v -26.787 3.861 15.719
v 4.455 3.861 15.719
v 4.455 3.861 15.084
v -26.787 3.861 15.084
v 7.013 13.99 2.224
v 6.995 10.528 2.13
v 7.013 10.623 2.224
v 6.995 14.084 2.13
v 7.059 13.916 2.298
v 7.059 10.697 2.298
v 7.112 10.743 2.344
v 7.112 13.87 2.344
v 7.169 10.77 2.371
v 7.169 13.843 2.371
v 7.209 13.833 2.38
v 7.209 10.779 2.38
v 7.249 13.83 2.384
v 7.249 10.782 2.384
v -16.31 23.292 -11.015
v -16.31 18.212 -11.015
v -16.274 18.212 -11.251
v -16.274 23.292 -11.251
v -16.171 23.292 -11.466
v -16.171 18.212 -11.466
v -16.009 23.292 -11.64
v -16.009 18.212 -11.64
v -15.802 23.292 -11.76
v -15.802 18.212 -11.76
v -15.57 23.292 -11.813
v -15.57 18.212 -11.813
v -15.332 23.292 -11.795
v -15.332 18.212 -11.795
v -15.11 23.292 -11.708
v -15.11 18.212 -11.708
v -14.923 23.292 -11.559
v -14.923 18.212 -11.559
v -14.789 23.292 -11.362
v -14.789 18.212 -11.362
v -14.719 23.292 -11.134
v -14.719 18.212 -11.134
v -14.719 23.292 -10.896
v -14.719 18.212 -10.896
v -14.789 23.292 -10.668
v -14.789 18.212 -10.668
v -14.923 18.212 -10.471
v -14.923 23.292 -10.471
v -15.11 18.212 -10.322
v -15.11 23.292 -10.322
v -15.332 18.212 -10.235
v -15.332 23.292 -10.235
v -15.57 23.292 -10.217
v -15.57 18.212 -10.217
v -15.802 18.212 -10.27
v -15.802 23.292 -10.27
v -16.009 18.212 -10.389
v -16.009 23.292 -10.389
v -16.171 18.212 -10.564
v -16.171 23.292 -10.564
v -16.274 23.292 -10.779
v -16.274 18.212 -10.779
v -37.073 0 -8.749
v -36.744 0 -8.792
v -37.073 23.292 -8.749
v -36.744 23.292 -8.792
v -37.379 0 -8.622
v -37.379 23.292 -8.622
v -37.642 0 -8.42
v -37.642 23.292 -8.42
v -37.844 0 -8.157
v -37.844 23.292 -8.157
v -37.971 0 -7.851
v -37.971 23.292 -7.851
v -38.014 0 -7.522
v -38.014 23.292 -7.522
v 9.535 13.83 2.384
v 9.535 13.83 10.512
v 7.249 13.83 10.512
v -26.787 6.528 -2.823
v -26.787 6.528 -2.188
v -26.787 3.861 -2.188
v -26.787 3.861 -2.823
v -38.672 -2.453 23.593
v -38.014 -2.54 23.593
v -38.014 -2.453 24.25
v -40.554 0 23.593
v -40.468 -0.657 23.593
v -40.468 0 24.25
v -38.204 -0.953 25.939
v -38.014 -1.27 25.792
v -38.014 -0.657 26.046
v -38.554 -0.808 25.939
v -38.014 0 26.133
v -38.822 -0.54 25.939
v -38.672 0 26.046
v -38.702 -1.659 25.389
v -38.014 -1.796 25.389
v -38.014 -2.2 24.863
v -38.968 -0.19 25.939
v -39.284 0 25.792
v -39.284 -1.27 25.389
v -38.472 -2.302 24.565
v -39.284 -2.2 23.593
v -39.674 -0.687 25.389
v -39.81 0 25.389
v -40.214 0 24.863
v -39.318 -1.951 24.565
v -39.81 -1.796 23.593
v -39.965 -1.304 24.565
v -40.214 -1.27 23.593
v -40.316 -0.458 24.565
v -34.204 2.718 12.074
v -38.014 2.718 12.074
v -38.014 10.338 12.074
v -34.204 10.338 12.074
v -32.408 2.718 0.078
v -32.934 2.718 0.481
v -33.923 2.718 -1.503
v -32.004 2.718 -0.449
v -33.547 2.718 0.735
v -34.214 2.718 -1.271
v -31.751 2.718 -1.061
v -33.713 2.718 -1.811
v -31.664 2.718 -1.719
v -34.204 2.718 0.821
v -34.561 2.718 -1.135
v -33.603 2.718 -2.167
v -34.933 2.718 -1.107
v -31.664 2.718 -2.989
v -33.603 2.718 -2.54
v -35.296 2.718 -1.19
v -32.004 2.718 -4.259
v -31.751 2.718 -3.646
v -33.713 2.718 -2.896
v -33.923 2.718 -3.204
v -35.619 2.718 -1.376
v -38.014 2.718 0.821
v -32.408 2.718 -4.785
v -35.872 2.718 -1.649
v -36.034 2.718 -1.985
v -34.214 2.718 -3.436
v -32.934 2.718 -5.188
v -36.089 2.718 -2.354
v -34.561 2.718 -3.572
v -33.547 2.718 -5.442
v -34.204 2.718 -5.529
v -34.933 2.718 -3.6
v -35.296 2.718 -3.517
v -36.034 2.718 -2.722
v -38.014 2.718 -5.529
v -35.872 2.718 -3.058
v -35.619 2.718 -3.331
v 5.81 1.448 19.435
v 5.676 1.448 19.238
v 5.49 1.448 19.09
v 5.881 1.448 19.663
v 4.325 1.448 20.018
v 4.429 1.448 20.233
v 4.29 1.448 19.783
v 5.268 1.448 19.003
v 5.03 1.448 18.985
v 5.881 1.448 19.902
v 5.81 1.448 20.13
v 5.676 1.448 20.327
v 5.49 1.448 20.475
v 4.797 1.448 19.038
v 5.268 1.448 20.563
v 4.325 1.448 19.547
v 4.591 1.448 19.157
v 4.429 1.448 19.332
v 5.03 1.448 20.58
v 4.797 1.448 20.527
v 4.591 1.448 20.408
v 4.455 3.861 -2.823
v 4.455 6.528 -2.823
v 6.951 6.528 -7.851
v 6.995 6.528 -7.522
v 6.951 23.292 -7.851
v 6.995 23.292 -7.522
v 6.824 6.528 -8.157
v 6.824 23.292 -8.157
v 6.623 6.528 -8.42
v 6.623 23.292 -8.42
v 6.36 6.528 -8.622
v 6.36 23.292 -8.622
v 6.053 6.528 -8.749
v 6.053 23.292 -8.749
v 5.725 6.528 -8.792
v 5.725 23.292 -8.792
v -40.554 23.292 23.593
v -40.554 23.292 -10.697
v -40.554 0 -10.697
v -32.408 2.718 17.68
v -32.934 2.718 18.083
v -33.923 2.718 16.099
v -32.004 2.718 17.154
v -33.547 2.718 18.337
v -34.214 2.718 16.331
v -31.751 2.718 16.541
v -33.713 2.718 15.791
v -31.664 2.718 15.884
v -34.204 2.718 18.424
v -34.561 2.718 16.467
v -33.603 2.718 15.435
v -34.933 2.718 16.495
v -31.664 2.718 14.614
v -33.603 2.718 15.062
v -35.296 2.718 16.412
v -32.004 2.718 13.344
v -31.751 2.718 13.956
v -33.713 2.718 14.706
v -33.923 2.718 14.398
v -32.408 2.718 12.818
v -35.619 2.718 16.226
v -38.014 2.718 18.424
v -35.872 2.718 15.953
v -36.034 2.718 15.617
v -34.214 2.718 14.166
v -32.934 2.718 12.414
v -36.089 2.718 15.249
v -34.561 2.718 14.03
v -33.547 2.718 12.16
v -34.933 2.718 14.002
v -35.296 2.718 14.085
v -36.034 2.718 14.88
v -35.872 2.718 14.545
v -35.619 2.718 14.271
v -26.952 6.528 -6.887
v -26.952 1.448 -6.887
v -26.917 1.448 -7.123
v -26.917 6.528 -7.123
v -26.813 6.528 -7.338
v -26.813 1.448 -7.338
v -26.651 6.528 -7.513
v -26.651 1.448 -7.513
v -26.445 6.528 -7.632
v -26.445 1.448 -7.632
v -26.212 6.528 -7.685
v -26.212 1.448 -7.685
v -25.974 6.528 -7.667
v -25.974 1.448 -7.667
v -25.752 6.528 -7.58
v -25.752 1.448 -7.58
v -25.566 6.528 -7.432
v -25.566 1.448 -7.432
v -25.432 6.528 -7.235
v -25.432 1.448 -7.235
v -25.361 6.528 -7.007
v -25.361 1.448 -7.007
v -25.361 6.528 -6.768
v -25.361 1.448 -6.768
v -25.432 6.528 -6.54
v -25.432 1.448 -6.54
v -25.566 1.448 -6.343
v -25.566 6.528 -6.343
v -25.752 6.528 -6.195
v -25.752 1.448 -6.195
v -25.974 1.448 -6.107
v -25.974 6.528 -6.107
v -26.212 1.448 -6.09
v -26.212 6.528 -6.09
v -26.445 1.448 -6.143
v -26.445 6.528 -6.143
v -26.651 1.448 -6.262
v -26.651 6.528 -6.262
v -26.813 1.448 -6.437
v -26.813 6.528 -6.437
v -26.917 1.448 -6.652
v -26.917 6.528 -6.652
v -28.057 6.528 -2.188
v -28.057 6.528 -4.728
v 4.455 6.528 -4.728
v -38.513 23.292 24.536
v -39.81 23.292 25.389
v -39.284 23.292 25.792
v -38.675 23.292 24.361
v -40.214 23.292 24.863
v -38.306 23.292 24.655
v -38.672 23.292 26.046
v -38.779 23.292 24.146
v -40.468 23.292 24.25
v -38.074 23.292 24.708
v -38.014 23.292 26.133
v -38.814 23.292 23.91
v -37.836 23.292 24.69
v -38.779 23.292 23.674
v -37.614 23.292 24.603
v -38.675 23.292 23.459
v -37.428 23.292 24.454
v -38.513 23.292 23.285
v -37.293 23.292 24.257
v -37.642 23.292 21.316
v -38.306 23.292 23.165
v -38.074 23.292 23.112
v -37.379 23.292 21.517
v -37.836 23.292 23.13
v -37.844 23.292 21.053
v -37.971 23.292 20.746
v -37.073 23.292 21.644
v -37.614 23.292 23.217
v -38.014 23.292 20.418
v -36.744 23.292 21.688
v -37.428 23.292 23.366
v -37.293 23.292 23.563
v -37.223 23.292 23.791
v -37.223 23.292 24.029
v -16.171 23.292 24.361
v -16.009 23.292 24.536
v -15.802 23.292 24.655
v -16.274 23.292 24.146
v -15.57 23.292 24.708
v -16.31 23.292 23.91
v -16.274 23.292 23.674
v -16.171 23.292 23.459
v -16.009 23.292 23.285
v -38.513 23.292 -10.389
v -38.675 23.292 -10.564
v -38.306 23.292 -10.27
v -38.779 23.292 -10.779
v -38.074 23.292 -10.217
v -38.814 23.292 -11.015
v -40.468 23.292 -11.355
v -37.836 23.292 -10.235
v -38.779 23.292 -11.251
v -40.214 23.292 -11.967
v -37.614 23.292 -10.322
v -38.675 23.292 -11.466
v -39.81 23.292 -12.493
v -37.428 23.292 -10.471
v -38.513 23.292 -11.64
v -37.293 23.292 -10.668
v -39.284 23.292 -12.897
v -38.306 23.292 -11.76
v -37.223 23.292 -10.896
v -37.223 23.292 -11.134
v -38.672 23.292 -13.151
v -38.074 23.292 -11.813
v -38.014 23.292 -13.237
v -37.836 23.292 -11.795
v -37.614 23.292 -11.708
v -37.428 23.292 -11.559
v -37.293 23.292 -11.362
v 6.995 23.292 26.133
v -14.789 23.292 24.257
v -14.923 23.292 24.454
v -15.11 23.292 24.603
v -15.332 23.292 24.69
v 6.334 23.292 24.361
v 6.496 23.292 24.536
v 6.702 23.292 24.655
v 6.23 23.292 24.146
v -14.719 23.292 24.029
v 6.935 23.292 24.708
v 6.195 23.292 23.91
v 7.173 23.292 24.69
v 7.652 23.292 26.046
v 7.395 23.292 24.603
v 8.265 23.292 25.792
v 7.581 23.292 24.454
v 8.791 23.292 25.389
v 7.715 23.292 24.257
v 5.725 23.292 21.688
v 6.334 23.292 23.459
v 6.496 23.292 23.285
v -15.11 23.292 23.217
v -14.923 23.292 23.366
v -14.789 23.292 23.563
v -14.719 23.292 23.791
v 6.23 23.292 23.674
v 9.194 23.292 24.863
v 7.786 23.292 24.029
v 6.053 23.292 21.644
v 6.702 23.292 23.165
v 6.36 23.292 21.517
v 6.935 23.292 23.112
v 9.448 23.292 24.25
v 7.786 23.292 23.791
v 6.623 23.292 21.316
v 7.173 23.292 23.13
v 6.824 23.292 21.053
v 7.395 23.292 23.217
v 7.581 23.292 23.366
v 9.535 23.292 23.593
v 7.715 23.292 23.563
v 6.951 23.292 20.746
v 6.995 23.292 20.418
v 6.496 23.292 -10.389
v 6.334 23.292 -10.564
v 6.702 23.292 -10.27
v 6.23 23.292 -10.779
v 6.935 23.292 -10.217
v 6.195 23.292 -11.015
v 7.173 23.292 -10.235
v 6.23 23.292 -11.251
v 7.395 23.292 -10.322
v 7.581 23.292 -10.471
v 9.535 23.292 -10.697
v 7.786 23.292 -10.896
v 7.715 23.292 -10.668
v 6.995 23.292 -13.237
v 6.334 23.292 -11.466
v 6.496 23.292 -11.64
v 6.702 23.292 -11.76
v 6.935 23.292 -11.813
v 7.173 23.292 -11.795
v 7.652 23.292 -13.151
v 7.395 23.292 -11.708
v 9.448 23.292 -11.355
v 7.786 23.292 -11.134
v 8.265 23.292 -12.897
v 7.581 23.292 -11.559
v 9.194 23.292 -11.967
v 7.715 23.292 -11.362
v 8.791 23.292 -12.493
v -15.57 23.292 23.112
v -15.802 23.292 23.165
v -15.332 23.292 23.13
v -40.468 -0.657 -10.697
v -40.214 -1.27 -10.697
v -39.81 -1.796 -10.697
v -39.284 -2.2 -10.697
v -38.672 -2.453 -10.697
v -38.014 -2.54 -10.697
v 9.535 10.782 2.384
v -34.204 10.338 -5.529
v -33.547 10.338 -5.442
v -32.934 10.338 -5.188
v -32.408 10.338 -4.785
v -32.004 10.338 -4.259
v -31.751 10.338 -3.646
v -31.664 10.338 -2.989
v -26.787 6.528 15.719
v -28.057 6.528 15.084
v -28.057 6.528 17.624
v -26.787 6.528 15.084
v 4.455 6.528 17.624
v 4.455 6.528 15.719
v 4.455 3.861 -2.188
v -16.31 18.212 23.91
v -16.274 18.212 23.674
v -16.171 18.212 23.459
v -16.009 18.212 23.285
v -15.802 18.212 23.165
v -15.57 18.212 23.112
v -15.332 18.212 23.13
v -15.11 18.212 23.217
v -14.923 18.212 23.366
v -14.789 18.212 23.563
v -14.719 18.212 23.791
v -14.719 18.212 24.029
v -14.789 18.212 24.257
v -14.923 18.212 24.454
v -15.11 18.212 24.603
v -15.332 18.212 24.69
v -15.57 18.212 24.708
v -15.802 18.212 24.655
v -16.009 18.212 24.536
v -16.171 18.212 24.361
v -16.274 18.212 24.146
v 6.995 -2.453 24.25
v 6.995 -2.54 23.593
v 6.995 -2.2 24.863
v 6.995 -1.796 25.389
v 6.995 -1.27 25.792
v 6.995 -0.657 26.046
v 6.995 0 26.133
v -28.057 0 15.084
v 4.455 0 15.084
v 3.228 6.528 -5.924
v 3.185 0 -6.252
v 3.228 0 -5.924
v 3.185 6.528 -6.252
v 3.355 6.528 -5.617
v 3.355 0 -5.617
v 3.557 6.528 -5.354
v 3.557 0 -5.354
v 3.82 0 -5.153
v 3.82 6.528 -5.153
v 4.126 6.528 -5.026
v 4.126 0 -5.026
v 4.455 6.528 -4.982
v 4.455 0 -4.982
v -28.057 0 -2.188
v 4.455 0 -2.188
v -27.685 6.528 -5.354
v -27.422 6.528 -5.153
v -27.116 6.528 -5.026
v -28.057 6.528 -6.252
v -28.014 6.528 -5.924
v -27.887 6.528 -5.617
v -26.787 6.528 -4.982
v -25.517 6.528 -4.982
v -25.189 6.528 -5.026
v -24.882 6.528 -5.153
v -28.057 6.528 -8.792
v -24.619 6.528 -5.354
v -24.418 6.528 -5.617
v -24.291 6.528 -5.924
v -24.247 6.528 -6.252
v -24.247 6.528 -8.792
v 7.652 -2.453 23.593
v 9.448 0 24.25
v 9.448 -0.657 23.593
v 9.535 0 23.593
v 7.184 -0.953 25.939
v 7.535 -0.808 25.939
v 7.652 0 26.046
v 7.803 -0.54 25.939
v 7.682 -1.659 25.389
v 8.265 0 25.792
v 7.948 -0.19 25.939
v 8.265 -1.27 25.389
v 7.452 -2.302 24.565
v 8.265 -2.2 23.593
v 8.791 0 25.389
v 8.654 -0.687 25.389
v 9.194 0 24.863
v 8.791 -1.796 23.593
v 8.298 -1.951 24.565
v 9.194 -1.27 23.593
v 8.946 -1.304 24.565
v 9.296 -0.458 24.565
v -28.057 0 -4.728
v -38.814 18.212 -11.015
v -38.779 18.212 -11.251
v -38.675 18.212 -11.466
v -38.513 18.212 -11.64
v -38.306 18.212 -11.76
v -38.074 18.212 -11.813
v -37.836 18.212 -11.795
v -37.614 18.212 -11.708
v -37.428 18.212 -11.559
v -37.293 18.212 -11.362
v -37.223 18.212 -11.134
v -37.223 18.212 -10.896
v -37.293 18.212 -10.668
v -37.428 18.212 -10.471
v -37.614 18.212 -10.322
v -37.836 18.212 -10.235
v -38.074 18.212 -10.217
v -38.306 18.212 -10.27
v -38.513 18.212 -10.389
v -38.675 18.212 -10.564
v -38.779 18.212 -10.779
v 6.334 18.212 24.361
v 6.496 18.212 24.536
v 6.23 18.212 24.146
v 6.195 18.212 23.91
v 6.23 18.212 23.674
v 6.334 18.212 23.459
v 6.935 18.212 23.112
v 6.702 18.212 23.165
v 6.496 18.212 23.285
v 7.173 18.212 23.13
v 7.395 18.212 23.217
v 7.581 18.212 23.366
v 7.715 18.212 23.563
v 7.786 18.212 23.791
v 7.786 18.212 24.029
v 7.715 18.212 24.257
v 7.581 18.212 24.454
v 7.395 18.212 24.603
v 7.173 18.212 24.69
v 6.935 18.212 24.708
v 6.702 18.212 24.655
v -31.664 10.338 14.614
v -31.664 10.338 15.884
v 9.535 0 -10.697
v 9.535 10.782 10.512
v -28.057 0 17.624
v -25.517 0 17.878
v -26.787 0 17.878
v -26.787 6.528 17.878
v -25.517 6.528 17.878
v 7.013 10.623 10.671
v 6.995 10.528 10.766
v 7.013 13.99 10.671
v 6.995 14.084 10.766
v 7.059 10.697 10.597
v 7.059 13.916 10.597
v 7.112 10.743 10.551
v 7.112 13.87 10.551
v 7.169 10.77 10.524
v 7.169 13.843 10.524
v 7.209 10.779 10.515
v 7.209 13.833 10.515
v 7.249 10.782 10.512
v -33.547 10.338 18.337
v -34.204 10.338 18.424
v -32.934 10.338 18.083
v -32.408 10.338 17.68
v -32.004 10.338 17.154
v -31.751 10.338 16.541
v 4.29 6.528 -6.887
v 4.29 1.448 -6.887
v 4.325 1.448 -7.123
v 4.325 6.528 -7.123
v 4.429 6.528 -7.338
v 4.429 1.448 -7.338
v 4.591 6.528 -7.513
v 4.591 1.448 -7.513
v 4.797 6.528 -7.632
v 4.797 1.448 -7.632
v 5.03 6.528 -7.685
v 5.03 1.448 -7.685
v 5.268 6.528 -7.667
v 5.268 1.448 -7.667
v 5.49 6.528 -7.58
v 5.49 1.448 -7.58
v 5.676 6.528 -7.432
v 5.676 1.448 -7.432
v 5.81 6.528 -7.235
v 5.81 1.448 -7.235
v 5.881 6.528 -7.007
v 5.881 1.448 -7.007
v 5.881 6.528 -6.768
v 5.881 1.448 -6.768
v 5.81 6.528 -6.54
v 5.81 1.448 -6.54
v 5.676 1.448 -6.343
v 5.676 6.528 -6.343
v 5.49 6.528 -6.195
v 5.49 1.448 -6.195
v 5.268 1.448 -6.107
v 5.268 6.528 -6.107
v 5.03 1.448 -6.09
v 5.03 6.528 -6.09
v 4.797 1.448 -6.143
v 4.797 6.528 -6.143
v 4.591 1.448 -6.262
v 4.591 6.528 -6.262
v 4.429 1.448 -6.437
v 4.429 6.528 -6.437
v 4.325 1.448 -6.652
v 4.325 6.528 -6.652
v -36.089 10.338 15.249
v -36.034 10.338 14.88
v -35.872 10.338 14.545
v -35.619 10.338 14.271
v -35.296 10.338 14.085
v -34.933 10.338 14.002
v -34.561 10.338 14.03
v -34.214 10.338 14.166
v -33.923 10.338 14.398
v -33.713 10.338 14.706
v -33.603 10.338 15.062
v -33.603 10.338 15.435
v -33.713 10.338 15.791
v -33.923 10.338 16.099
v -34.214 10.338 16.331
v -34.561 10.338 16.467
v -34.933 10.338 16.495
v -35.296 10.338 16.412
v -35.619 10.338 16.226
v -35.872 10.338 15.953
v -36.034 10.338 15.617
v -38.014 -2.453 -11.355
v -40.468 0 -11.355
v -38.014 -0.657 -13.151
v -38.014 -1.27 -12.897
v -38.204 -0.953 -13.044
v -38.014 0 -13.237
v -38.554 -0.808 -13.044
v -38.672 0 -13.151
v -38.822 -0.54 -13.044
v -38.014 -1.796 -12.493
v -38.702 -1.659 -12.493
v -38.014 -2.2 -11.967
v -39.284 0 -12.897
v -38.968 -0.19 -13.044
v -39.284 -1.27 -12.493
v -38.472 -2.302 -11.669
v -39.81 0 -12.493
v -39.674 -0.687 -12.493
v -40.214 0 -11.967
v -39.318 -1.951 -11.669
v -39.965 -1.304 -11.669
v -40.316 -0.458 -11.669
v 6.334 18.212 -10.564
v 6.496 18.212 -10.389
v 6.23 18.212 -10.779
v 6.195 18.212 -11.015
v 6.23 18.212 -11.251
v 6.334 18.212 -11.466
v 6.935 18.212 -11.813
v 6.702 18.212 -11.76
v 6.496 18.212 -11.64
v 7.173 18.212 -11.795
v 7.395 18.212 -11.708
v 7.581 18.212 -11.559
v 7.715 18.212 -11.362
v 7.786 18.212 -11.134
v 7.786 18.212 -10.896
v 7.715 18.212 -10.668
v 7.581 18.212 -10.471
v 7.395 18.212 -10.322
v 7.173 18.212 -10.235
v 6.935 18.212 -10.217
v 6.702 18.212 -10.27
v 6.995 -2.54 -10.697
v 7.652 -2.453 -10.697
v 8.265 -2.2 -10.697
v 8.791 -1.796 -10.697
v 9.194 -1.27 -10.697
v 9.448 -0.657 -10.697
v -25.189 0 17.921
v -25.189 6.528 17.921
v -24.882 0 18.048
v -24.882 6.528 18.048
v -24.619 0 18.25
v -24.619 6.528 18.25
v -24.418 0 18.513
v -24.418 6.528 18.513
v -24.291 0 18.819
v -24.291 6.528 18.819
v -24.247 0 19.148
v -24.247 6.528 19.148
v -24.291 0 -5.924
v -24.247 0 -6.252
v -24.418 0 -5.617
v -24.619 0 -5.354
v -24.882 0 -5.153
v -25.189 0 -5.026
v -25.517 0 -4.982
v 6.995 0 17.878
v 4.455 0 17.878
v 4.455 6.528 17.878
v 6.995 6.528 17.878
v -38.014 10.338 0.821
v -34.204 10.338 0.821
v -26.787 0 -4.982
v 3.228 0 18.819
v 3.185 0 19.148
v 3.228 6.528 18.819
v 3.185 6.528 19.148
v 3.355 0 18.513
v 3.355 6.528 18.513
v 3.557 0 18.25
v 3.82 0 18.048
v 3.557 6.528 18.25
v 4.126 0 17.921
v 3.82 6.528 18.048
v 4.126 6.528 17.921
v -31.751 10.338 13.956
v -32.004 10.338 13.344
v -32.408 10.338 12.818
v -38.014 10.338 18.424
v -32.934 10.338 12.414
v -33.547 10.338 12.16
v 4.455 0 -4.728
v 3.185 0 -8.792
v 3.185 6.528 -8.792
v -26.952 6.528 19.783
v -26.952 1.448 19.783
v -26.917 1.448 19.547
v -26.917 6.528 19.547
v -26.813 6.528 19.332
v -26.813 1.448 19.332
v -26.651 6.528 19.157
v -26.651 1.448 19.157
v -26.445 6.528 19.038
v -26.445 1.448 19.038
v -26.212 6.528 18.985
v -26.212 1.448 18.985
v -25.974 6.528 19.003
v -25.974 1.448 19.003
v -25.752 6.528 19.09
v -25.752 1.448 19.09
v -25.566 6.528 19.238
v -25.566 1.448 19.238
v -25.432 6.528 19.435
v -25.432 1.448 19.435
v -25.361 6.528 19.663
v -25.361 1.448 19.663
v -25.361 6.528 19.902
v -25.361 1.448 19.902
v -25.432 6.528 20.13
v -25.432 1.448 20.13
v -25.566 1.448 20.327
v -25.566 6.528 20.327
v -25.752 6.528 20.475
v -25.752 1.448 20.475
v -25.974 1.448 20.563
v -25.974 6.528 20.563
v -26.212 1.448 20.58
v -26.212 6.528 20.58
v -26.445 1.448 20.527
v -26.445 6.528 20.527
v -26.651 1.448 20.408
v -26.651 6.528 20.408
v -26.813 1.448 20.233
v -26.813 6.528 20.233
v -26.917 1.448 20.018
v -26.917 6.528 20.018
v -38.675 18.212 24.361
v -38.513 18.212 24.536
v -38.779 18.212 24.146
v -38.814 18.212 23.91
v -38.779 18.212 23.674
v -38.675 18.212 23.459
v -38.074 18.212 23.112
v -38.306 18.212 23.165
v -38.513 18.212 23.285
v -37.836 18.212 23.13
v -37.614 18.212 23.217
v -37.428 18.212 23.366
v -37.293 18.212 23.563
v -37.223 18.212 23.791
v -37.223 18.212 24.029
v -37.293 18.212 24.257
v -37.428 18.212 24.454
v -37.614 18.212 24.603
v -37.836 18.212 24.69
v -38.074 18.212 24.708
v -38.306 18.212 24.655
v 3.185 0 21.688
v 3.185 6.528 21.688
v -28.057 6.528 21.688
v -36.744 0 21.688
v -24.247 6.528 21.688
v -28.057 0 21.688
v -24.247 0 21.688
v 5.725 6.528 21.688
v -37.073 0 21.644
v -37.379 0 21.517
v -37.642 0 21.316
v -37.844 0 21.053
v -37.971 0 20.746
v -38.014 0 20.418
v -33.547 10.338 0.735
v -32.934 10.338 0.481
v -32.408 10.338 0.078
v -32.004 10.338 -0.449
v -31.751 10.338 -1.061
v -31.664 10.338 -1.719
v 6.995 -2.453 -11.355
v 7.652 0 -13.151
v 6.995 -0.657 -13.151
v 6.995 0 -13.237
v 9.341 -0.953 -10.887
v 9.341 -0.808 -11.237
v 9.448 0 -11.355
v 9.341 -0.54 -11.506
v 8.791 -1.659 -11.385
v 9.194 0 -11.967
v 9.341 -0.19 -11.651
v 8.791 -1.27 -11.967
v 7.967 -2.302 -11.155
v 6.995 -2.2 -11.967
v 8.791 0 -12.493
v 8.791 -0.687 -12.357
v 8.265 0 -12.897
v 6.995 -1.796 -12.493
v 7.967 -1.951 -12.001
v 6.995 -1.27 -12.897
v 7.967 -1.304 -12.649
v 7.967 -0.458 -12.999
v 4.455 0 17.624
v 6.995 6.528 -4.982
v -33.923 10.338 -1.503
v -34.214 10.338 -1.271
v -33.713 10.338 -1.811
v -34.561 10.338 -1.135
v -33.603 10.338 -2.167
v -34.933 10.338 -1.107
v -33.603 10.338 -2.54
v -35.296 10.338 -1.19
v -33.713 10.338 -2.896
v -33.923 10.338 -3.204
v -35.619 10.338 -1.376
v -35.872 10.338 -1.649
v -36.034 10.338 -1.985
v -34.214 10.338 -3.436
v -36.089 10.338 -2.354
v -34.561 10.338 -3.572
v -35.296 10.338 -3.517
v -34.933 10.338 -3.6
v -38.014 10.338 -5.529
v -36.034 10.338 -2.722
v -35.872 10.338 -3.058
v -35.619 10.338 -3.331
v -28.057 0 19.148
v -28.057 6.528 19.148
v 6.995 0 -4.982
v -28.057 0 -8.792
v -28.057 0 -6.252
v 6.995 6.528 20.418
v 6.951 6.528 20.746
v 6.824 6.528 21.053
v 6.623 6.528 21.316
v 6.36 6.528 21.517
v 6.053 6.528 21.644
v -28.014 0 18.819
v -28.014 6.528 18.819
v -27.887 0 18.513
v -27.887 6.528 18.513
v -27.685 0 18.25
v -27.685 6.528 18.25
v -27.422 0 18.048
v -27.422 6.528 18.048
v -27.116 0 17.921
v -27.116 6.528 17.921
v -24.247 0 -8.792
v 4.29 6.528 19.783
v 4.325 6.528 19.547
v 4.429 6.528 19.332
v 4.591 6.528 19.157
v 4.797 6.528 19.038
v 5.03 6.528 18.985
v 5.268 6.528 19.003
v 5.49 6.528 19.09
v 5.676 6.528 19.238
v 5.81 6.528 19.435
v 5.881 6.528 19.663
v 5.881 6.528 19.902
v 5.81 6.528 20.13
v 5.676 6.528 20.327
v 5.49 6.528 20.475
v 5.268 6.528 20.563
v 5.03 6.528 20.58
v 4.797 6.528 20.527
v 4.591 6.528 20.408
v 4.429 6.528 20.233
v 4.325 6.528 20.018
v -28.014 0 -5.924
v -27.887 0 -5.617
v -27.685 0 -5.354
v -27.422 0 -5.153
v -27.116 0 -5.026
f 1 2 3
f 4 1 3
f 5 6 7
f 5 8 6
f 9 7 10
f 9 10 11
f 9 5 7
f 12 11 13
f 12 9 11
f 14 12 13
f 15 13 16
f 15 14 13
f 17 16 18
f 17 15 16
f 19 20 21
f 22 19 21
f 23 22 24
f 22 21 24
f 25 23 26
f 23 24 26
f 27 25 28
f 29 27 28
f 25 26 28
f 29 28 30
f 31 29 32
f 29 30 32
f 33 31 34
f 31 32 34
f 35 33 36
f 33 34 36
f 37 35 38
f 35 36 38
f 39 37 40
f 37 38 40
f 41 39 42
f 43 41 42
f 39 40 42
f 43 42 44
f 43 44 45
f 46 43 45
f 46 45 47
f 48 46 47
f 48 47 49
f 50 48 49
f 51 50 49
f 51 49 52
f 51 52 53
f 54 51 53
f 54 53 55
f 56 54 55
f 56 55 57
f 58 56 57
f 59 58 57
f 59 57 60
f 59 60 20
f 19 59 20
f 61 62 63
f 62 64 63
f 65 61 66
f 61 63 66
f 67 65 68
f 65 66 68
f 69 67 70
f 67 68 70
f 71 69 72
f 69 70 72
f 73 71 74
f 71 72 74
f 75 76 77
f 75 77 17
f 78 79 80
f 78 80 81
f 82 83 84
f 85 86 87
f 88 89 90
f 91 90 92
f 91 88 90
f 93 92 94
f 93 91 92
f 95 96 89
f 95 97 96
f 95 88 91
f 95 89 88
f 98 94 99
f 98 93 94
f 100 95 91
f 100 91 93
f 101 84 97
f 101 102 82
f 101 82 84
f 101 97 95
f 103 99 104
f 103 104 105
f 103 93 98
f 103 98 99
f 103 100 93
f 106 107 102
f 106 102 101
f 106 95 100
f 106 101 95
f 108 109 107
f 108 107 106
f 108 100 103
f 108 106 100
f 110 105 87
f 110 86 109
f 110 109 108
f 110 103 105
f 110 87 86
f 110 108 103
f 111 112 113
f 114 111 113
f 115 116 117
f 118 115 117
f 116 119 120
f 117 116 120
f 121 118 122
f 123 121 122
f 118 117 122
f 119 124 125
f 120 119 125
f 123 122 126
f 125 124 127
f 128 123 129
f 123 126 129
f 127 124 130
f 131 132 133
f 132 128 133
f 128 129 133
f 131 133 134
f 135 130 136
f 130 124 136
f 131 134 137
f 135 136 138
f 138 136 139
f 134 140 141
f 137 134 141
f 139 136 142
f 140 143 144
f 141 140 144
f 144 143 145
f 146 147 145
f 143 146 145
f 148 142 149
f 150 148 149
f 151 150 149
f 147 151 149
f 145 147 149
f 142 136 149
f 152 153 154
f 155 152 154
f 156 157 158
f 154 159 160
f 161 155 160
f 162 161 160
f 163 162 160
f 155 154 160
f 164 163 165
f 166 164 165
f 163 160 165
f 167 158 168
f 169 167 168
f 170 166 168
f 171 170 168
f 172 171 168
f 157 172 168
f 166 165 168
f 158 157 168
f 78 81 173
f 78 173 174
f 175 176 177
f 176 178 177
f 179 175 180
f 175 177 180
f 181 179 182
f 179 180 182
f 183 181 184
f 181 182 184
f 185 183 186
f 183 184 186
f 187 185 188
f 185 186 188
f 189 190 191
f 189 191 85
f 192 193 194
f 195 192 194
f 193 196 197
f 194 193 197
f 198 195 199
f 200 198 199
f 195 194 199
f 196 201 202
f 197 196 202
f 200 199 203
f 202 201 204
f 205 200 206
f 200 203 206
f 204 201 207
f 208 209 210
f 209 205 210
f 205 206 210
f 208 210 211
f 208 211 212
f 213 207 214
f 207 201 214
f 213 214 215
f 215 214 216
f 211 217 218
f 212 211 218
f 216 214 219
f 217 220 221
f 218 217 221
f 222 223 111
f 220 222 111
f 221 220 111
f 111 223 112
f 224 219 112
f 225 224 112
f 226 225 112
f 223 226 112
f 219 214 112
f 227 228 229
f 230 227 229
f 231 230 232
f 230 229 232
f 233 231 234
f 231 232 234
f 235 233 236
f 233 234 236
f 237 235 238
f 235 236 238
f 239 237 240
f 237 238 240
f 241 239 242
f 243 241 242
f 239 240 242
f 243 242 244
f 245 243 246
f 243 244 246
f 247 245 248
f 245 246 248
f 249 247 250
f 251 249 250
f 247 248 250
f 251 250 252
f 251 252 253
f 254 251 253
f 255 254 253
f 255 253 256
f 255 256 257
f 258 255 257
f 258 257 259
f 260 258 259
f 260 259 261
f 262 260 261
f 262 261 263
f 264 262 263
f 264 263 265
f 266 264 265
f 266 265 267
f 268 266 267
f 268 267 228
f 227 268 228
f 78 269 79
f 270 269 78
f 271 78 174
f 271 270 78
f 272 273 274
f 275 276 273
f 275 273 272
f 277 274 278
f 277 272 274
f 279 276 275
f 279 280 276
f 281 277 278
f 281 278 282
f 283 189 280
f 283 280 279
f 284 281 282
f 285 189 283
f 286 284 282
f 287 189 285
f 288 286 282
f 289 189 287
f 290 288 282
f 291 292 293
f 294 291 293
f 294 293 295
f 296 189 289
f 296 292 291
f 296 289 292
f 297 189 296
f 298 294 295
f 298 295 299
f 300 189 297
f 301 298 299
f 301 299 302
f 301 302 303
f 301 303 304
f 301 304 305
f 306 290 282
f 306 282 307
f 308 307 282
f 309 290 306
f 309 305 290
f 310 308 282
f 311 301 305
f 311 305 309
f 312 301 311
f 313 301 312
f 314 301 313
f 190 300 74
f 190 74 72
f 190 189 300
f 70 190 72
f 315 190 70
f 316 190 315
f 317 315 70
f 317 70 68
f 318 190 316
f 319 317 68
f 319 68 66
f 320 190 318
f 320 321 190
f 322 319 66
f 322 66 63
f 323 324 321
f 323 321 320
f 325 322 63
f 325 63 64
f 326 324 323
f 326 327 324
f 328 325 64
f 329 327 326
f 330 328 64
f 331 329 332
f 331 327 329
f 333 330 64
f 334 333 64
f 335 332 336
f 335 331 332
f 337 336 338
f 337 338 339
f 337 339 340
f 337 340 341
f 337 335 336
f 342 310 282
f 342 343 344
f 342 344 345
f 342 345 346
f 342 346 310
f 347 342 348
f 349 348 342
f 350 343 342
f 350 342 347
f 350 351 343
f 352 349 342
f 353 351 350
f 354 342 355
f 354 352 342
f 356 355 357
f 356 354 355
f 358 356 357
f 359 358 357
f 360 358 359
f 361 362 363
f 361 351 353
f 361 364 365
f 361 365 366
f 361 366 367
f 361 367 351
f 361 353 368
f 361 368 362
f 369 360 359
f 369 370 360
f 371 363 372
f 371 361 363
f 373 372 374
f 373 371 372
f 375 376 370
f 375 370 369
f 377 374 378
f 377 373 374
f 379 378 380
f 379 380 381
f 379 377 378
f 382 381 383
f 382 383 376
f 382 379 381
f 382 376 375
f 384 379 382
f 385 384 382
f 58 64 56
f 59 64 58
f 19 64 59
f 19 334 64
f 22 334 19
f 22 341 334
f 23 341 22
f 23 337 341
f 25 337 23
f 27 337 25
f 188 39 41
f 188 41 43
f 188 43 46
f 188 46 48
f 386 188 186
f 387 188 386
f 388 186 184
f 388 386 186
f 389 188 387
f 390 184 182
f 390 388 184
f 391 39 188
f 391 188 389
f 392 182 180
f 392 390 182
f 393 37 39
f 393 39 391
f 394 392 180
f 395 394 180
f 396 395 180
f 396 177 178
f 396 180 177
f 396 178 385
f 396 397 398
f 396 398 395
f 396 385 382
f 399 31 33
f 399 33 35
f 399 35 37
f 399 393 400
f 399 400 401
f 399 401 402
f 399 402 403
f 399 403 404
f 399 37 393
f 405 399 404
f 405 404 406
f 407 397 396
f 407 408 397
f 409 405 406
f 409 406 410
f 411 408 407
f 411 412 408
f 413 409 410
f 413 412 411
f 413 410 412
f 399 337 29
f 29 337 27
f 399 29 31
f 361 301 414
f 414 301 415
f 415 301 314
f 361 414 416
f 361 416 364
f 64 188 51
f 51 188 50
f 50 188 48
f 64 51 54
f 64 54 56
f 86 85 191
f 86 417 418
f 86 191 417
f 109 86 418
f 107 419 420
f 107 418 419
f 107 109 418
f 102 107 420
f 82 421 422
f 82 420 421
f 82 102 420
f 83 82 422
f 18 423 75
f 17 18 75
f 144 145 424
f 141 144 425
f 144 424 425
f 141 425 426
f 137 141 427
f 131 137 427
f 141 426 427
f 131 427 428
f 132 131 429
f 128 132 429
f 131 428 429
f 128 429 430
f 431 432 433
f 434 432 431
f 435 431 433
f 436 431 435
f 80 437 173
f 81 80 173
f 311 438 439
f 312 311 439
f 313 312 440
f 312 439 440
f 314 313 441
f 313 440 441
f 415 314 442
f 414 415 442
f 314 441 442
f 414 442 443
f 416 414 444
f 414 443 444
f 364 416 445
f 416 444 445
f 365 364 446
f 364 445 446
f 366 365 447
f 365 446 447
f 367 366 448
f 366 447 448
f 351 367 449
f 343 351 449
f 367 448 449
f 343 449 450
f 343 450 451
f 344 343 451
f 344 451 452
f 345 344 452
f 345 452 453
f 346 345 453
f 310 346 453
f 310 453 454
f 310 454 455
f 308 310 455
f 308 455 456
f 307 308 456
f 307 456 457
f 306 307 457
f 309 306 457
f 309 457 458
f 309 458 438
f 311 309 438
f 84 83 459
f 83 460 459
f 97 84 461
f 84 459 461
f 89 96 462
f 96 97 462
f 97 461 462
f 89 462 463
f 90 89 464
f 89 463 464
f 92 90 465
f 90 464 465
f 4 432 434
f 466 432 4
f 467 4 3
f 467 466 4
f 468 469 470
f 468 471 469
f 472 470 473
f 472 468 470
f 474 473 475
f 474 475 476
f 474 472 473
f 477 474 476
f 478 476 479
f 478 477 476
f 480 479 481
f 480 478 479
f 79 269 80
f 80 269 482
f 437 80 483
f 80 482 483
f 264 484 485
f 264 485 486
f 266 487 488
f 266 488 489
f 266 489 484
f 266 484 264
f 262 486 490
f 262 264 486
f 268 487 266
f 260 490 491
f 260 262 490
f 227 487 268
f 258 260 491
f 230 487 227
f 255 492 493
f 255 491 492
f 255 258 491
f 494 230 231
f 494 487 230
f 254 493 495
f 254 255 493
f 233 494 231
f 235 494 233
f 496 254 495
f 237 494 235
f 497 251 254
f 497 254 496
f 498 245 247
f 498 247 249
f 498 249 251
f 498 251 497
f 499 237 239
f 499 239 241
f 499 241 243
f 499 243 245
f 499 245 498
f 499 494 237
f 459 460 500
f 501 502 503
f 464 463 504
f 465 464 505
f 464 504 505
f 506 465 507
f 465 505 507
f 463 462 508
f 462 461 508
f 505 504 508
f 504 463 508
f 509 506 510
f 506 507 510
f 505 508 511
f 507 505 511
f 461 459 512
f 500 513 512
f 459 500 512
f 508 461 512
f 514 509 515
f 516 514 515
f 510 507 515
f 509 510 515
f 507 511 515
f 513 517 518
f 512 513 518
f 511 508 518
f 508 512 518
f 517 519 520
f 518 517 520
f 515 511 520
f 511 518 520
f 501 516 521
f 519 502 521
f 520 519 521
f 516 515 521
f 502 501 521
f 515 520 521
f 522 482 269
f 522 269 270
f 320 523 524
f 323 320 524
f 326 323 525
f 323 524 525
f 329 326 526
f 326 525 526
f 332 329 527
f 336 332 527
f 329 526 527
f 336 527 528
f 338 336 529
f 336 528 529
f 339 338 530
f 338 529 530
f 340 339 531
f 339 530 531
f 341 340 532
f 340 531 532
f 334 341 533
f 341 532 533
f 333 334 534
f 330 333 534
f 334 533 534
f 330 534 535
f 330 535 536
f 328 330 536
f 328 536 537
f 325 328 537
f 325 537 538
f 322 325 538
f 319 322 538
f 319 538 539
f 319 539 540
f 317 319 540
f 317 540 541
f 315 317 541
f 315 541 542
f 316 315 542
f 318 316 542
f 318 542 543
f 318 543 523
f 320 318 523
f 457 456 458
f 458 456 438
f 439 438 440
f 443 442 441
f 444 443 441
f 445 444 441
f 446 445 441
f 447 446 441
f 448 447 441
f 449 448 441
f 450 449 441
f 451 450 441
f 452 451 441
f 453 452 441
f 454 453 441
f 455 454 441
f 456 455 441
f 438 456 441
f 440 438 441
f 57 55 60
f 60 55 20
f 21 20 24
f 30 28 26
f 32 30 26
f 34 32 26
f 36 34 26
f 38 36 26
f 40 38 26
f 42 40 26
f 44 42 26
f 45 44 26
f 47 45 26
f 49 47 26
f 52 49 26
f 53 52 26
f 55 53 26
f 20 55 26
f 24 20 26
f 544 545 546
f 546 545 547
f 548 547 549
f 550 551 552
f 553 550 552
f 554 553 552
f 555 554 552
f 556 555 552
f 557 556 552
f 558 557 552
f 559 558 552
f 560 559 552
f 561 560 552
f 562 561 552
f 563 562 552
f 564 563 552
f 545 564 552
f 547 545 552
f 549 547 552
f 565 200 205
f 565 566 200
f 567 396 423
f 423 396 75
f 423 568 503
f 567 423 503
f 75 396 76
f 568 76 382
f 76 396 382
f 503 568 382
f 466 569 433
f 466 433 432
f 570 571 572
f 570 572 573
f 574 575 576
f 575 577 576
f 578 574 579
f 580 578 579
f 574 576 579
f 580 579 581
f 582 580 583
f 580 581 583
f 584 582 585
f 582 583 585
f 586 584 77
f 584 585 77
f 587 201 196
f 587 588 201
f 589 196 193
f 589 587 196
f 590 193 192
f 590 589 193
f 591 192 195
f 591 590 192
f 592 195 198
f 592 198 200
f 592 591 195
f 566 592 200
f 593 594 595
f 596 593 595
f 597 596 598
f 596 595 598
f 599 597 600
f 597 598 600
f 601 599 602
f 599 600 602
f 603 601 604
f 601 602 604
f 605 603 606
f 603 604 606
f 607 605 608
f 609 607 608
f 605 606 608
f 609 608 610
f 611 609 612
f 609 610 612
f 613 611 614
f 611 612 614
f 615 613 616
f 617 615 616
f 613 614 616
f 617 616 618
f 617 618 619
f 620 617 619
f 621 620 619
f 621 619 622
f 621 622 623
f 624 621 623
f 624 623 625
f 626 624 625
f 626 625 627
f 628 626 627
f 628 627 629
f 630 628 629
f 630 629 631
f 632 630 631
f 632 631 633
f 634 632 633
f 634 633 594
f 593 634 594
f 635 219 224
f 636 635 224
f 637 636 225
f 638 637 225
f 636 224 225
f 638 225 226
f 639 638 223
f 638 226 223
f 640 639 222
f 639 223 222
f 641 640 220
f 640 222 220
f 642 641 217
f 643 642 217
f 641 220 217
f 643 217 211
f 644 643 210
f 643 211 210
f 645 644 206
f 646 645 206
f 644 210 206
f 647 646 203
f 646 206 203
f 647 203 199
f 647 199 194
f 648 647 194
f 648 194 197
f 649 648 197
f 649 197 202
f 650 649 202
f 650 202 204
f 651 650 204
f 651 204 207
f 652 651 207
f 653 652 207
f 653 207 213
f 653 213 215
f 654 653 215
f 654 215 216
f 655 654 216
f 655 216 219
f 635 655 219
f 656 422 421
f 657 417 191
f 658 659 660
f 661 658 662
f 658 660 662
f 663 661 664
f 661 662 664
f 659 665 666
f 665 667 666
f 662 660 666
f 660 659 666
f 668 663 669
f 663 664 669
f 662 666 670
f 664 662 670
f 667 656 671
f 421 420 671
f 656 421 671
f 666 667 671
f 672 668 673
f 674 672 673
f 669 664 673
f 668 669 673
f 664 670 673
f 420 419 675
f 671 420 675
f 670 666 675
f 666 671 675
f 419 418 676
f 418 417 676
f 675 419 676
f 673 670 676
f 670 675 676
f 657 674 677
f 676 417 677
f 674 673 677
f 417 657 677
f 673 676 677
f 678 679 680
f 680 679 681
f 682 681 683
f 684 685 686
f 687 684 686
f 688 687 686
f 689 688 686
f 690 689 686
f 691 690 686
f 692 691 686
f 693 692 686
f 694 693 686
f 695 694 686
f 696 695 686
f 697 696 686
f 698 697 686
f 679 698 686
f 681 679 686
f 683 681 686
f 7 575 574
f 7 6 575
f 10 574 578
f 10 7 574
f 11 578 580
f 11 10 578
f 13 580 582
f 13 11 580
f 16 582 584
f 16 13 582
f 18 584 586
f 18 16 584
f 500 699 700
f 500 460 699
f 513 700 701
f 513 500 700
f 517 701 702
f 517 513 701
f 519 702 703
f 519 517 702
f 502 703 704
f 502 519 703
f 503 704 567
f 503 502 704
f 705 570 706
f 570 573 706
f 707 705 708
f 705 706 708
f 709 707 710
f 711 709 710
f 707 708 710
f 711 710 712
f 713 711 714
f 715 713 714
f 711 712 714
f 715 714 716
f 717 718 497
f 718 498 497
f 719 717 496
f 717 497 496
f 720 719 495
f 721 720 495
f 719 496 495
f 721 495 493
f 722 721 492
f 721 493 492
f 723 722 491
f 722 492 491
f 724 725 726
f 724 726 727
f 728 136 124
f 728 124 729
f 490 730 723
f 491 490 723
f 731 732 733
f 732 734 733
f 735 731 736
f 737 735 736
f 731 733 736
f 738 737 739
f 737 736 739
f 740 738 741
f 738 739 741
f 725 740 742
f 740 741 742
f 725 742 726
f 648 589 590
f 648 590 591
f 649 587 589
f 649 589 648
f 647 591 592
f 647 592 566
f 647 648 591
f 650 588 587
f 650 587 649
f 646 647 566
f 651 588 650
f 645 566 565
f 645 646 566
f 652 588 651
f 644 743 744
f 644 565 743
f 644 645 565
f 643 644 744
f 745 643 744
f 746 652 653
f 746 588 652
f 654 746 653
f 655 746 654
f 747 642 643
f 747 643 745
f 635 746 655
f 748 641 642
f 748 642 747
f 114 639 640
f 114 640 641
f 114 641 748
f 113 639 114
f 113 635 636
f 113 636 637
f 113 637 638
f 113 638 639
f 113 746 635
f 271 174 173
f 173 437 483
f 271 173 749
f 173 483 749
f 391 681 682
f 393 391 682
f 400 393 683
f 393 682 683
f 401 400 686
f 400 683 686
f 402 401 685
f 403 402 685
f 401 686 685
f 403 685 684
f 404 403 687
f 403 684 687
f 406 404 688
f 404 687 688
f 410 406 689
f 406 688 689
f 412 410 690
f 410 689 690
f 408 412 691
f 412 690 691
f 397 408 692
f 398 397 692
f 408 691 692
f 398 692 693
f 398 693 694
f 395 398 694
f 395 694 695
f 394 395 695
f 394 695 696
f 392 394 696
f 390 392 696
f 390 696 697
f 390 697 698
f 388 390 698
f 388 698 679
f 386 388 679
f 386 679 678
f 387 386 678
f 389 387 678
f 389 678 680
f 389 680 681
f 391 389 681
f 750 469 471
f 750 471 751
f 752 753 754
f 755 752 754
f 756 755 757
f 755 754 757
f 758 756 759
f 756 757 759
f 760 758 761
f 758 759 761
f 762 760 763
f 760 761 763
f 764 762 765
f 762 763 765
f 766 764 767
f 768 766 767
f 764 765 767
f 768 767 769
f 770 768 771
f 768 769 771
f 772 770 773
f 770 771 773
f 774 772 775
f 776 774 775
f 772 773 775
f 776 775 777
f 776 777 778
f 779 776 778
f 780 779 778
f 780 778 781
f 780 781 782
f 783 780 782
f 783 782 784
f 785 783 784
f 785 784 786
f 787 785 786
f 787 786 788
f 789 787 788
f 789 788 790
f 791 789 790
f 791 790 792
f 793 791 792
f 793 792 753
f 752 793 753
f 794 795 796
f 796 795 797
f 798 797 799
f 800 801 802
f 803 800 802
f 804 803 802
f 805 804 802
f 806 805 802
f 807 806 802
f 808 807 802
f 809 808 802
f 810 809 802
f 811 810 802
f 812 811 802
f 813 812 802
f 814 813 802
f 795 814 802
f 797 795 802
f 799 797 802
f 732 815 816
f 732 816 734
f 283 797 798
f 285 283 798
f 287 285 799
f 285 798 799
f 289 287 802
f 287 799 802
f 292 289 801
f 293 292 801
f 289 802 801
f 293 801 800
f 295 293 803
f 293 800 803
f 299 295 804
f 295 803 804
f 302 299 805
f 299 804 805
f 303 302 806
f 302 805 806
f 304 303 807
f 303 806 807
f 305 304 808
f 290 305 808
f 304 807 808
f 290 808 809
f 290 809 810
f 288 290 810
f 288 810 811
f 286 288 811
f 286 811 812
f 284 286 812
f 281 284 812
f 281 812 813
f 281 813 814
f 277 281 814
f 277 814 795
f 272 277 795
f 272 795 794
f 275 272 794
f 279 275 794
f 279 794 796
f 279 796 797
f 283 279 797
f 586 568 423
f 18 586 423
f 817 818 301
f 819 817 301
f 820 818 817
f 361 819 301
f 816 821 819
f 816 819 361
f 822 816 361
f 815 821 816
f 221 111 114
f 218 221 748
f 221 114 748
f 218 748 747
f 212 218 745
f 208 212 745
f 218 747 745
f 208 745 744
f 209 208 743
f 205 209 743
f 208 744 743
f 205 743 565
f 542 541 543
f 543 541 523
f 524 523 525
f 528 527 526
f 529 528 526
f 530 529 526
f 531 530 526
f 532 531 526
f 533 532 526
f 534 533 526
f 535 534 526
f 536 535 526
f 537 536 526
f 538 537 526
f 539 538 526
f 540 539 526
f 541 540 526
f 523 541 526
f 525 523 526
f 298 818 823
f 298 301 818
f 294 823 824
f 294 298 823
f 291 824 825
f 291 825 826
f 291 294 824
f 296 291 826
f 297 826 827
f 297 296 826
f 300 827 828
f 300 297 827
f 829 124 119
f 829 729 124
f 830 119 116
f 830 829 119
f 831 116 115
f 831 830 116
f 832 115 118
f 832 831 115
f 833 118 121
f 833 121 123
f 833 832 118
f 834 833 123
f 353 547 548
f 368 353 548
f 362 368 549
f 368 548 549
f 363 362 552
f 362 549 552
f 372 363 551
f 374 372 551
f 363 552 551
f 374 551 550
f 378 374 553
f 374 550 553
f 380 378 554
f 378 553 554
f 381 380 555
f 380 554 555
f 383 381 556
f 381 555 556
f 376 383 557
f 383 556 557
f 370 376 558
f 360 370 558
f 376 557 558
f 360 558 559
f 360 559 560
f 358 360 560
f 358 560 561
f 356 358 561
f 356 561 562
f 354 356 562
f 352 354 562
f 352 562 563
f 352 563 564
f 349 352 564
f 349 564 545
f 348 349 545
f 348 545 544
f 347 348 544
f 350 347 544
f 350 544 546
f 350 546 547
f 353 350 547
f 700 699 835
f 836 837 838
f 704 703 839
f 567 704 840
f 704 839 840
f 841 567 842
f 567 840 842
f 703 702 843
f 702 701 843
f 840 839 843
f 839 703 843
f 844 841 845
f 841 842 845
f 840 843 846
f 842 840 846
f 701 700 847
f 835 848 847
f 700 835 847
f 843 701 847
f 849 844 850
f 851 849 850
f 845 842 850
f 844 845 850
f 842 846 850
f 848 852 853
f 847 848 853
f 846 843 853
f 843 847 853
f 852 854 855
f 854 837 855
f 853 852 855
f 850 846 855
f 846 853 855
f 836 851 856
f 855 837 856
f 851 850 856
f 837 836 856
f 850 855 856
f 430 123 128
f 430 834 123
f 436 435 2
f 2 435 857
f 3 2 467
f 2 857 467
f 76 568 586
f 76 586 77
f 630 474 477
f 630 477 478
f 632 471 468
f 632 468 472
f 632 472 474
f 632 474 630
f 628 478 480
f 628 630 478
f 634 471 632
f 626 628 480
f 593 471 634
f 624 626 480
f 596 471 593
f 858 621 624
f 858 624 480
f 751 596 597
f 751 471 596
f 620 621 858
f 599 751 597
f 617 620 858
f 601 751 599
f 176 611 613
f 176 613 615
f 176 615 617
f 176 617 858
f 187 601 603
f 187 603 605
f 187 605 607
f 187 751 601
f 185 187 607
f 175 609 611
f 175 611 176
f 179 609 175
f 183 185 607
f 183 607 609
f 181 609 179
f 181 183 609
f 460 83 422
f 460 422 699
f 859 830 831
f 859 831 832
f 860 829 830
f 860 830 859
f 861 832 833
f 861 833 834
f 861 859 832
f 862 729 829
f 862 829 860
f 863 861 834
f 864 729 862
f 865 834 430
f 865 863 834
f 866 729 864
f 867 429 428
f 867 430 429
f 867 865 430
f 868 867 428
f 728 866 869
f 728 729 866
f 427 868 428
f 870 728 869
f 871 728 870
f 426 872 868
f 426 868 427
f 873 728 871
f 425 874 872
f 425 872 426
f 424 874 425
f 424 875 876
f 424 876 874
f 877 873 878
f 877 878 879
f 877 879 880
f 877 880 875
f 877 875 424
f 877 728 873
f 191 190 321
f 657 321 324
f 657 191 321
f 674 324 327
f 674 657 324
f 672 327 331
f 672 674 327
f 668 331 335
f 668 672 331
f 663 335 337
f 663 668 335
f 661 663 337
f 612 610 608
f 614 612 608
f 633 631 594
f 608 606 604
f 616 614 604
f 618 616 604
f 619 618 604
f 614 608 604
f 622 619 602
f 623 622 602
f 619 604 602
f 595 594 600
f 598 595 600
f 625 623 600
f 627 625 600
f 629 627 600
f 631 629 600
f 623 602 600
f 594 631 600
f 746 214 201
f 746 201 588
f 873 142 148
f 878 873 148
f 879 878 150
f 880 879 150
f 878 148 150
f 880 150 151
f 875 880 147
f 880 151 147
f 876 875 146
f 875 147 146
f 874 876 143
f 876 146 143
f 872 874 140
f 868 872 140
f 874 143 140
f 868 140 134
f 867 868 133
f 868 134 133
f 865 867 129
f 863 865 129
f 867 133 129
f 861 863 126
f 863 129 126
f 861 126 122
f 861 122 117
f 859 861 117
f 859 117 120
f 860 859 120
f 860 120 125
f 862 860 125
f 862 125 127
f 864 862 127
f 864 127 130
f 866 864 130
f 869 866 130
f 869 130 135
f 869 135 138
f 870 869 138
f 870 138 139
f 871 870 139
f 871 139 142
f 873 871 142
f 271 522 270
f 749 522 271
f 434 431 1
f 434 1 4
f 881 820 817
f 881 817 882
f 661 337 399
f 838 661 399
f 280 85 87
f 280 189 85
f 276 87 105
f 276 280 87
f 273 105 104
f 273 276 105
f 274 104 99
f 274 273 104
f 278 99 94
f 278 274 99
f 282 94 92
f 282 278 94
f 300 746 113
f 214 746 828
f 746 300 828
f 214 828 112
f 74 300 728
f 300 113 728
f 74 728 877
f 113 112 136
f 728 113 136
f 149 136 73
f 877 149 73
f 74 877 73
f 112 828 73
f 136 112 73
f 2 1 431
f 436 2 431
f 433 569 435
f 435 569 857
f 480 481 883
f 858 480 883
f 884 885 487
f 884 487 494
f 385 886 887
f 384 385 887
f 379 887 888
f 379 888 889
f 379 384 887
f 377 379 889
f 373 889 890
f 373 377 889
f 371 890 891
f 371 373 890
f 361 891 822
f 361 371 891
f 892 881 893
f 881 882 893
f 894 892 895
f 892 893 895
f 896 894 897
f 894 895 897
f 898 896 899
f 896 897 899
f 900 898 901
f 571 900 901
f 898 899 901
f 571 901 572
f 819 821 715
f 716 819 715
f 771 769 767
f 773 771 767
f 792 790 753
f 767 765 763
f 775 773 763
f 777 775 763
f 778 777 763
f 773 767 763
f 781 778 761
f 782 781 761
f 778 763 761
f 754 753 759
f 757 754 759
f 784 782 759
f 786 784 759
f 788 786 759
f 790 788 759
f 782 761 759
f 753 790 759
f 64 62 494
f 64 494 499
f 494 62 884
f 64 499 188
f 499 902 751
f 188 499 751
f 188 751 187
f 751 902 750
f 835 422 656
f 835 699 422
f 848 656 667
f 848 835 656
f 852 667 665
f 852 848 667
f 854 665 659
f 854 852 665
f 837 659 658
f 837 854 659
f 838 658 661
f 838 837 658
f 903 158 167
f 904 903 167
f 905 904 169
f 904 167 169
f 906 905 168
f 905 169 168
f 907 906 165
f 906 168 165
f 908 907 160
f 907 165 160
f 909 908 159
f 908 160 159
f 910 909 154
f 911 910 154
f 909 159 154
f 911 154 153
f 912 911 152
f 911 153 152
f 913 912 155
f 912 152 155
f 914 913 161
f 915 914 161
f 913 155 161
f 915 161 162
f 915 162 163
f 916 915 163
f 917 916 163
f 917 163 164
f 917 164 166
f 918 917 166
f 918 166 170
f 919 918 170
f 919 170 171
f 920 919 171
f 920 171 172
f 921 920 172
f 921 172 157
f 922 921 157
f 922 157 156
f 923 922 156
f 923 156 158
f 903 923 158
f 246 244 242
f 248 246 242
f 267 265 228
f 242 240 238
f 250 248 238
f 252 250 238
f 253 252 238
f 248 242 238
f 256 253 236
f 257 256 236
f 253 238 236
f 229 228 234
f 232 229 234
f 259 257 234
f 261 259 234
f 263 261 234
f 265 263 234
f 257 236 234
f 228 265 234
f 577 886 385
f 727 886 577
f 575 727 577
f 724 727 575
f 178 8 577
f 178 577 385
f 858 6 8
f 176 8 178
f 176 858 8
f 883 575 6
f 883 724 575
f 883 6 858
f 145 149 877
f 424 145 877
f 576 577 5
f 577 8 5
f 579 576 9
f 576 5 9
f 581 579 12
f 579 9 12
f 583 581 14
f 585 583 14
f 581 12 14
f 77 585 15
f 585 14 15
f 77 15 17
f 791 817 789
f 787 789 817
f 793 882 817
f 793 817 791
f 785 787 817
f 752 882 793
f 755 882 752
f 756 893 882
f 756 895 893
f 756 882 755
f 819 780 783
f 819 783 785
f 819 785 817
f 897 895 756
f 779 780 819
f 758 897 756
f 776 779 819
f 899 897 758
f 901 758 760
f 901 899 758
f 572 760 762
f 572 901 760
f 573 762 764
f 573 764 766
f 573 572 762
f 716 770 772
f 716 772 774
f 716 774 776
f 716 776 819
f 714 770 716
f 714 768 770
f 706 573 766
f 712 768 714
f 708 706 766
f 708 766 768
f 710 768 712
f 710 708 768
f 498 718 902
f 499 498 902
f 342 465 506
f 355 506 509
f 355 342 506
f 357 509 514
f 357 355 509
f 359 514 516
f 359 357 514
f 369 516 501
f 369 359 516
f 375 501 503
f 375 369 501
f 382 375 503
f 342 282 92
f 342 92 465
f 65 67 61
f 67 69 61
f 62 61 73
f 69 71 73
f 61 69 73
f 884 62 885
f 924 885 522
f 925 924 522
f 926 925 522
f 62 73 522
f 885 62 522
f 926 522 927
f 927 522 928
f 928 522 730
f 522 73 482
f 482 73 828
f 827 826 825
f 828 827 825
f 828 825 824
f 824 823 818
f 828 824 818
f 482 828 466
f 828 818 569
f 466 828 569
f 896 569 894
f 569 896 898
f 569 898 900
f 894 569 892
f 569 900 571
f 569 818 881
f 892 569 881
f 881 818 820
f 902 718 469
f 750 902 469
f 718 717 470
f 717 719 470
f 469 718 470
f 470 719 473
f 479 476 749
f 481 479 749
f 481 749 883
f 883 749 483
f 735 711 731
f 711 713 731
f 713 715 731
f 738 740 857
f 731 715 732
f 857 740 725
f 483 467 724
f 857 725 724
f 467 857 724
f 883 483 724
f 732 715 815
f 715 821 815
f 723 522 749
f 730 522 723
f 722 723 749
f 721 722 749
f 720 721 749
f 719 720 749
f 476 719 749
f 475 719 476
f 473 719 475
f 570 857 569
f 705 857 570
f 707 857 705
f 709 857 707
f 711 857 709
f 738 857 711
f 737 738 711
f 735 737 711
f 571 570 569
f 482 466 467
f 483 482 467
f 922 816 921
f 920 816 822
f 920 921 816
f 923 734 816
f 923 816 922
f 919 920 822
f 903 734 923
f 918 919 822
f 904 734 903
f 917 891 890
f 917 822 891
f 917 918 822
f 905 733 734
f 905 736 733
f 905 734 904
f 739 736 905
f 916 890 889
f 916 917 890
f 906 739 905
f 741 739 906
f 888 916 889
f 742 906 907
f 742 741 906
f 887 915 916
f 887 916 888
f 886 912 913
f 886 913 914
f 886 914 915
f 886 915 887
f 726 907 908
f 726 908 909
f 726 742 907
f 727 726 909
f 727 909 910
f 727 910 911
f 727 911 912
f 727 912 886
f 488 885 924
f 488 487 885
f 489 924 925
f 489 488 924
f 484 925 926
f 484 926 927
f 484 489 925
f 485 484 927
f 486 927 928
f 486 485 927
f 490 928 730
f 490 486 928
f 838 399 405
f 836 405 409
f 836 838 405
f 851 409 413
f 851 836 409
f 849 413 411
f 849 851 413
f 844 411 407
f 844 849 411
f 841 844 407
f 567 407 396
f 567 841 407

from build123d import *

# Parameters (mm, degrees)
SKETCH1_W                      = 50.0888
SKETCH1_H                      = 39.37
SKETCH1_W_2                    = 45.0088
SKETCH1_H_2                    = 30.48
BOSS_EXTRUDE1_DEPTH            = 23.2918
SKETCH2_W                      = 50.0888
SKETCH2_H                      = 39.37
BOSS_EXTRUDE2_DEPTH            = 2.54
SKETCH3_W                      = 32.512
SKETCH3_H                      = 2.54
BOSS_EXTRUDE3_DEPTH            = 6.5278
F_1_6_1_6_DIAMETER_HOLE1_D     = 1.6
F_1_6_1_6_DIAMETER_HOLE1_DEPTH = 5.08
FILLET1_R                      = 2.54
SKETCH12_W                     = 6.35
SKETCH12_H                     = 7.62
BOSS_EXTRUDE5_DEPTH            = 6.35
F_2_5_2_5_DIAMETER_HOLE2_D     = 2.5
F_2_5_2_5_DIAMETER_HOLE2_DEPTH = 7.62
FILLET2_R                      = 2.54
SKETCH17_W                     = 0.635
SKETCH17_H                     = 2.667
CUT_EXTRUDE3_DEPTH             = 31.242
SKETCH18_W                     = 0.635
SKETCH18_H                     = 2.667
CUT_EXTRUDE5_DEPTH             = 31.242
SKETCH15_W                     = 3.81
SKETCH15_H                     = 3.81
BOSS_EXTRUDE6_DEPTH            = 6.5278
FILLET3_R                      = 1.27
F_1_6_1_6_DIAMETER_HOLE2_D     = 1.6
F_1_6_1_6_DIAMETER_HOLE2_DEPTH = 5.08
CUT_EXTRUDE6_REACH             = 63.109
SKETCH23_W                     = 8.128
SKETCH23_H                     = 3.048
FILLET4_R                      = 0.254
FILLET5_R                      = 1.27


with BuildPart() as part:
    # Sketch1 → Boss-Extrude1 (new body)
    with BuildSketch(Plane(origin=(0, 0, 0), x_dir=(1, 0, 0), z_dir=(0, 1, 0))):
        with Locations((-15.50978333, -6.447590566)):
            Rectangle(SKETCH1_W, SKETCH1_H)
        with Locations((-15.50978333, -6.447590566)):
            Rectangle(SKETCH1_W_2, SKETCH1_H_2, mode=Mode.SUBTRACT)
    extrude(amount=BOSS_EXTRUDE1_DEPTH)

    # Sketch2 → Boss-Extrude2 (add)
    with BuildSketch(Plane.XZ):
        with Locations((-15.50978333, 6.447590566)):
            Rectangle(SKETCH2_W, SKETCH2_H)
    extrude(amount=BOSS_EXTRUDE2_DEPTH)

    # Sketch3 → Boss-Extrude3 (add)
    with BuildSketch(Plane(origin=(0, 0, 0), x_dir=(1, 0, 0), z_dir=(0, 1, 0))):
        with Locations((-11.80138333, 3.458409434)):
            Rectangle(SKETCH3_W, SKETCH3_H)
        with Locations((-11.80138333, -16.353590566)):
            Rectangle(SKETCH3_W, SKETCH3_H)
    extrude(amount=BOSS_EXTRUDE3_DEPTH)

    # Ø1.6 (1.6) Diameter Hole1
    with Locations(Plane(origin=(0, 23.2918, 0), x_dir=(1, 0, 0), z_dir=(0, 1, 0))):
        with Locations((-38.01418333, -23.910090566), (6.99461667, -23.910090566), (6.99461667, 11.014909434), (-38.01418333, 11.014909434), (-15.50978333, 11.014909434), (-15.50978333, -23.910090566)):
            Hole(F_1_6_1_6_DIAMETER_HOLE1_D / 2, depth=F_1_6_1_6_DIAMETER_HOLE1_DEPTH)

    # Fillet1
    fillet1_edges = [part.edges().sort_by_distance(p)[0] for p in [
        (-40.55418333, -2.54, 6.447590566),
        (-15.50978333, -2.54, -13.237409434),
        (9.53461667, -2.54, 6.447590566),
        (-15.50978333, -2.54, 26.132590566),
        (-40.55418333, 10.3759, -13.237409434),
        (9.53461667, 10.3759, -13.237409434),
        (9.53461667, 10.3759, 26.132590566),
        (-40.55418333, 10.3759, 26.132590566),
    ]]
    fillet(fillet1_edges, radius=FILLET1_R)

    # Sketch12 → Boss-Extrude5 (add)
    with BuildSketch(Plane(origin=(-38.01418333, 0, 0), x_dir=(0, 0, -1), z_dir=(1, 0, 0))):
        with Locations((-15.248690566, 6.5278)):
            Rectangle(SKETCH12_W, SKETCH12_H)
        with Locations((2.353509434, 6.5278)):
            Rectangle(SKETCH12_W, SKETCH12_H)
    extrude(amount=BOSS_EXTRUDE5_DEPTH)

    # Ø2.5 (2.5) Diameter Hole2
    with Locations(Plane(origin=(0, 10.3378, 0), x_dir=(1, 0, 0), z_dir=(0, 1, 0))):
        with Locations((-34.83918333, -15.248690566), (-34.83918333, 2.353509434)):
            Hole(F_2_5_2_5_DIAMETER_HOLE2_D / 2, depth=F_2_5_2_5_DIAMETER_HOLE2_DEPTH)

    # Fillet2
    fillet2_edges = [part.edges().sort_by_distance(p)[0] for p in [
        (-31.66418333, 6.5278, 18.423690566),
        (-31.66418333, 6.5278, 12.073690566),
        (-31.66418333, 6.5278, 0.821490566),
        (-31.66418333, 6.5278, -5.528509434),
    ]]
    fillet(fillet2_edges, radius=FILLET2_R)

    # Sketch17 → Cut-Extrude3 (cut)
    with BuildSketch(Plane(origin=(4.45461667, 0, 0), x_dir=(0, 0, -1), z_dir=(1, 0, 0))):
        with Locations((2.505909434, 5.1943)):
            Rectangle(SKETCH17_W, SKETCH17_H)
    extrude(amount=-CUT_EXTRUDE3_DEPTH, mode=Mode.SUBTRACT)

    # Sketch18 → Cut-Extrude5 (cut)
    with BuildSketch(Plane(origin=(4.45461667, 0, 0), x_dir=(0, 0, -1), z_dir=(1, 0, 0))):
        with Locations((-15.401090566, 5.1943)):
            Rectangle(SKETCH18_W, SKETCH18_H)
    extrude(amount=-CUT_EXTRUDE5_DEPTH, mode=Mode.SUBTRACT)

    # Sketch15 → Boss-Extrude6 (add)
    with BuildSketch(Plane(origin=(0, 0, 0), x_dir=(1, 0, 0), z_dir=(0, 1, 0))):
        with Locations((5.08961667, 6.887409434)):
            Rectangle(SKETCH15_W, SKETCH15_H)
        with Locations((-26.15238333, 6.887409434)):
            Rectangle(SKETCH15_W, SKETCH15_H)
        with Locations((-26.15238333, -19.782590566)):
            Rectangle(SKETCH15_W, SKETCH15_H)
        with Locations((5.08961667, -19.782590566)):
            Rectangle(SKETCH15_W, SKETCH15_H)
    extrude(amount=BOSS_EXTRUDE6_DEPTH)

    # Fillet3
    fillet3_edges = [part.edges().sort_by_distance(p)[0] for p in [
        (3.18461667, 3.2639, -4.982409434),
        (-28.05738333, 3.2639, -4.982409434),
        (-24.24738333, 3.2639, -4.982409434),
        (-28.05738333, 3.2639, 17.877590566),
        (-24.24738333, 3.2639, 17.877590566),
        (3.18461667, 3.2639, 17.877590566),
    ]]
    fillet(fillet3_edges, radius=FILLET3_R)

    # Ø1.6 (1.6) Diameter Hole2
    with Locations(Plane(origin=(0, 6.5278, 0), x_dir=(1, 0, 0), z_dir=(0, 1, 0))):
        with Locations((-26.15238333, -19.782590566), (-26.15238333, 6.887409434), (5.08961667, 6.887409434), (5.08961667, -19.782590566)):
            Hole(F_1_6_1_6_DIAMETER_HOLE2_D / 2, depth=F_1_6_1_6_DIAMETER_HOLE2_DEPTH)

    # Sketch23 → Cut-Extrude6 (cut, up to next)
    with BuildSketch(Plane(origin=(9.53461667, 0, 0), x_dir=(0, 0, -1), z_dir=(1, 0, 0)), mode=Mode.PRIVATE) as cut_extrude6_sk1:
        with Locations((-6.447590566, 12.3063)):
            Rectangle(SKETCH23_W, SKETCH23_H)
    cut_extrude6_tool1 = extrude(cut_extrude6_sk1.sketch, amount=-CUT_EXTRUDE6_REACH, mode=Mode.PRIVATE) & part.part
    add(cut_extrude6_tool1.solids().sort_by_distance((9.534617, 12.3063, 6.447591))[0], mode=Mode.SUBTRACT)

    # Fillet4
    fillet4_edges = [part.edges().sort_by_distance(p)[0] for p in [
        (6.99461667, 12.3063, 10.511590566),
        (6.99461667, 13.8303, 6.447590566),
        (6.99461667, 12.3063, 2.383590566),
        (6.99461667, 10.7823, 6.447590566),
    ]]
    fillet(fillet4_edges, radius=FILLET4_R)

    # Fillet5
    fillet5_edges = [part.edges().sort_by_distance(p)[0] for p in [
        (-38.01418333, 11.6459, -8.792409434),
        (-38.01418333, 11.6459, 21.687590566),
        (6.99461667, 14.9098, 21.687590566),
        (6.99461667, 14.9098, -8.792409434),
    ]]
    fillet(fillet5_edges, radius=FILLET5_R)


solid = part.part
